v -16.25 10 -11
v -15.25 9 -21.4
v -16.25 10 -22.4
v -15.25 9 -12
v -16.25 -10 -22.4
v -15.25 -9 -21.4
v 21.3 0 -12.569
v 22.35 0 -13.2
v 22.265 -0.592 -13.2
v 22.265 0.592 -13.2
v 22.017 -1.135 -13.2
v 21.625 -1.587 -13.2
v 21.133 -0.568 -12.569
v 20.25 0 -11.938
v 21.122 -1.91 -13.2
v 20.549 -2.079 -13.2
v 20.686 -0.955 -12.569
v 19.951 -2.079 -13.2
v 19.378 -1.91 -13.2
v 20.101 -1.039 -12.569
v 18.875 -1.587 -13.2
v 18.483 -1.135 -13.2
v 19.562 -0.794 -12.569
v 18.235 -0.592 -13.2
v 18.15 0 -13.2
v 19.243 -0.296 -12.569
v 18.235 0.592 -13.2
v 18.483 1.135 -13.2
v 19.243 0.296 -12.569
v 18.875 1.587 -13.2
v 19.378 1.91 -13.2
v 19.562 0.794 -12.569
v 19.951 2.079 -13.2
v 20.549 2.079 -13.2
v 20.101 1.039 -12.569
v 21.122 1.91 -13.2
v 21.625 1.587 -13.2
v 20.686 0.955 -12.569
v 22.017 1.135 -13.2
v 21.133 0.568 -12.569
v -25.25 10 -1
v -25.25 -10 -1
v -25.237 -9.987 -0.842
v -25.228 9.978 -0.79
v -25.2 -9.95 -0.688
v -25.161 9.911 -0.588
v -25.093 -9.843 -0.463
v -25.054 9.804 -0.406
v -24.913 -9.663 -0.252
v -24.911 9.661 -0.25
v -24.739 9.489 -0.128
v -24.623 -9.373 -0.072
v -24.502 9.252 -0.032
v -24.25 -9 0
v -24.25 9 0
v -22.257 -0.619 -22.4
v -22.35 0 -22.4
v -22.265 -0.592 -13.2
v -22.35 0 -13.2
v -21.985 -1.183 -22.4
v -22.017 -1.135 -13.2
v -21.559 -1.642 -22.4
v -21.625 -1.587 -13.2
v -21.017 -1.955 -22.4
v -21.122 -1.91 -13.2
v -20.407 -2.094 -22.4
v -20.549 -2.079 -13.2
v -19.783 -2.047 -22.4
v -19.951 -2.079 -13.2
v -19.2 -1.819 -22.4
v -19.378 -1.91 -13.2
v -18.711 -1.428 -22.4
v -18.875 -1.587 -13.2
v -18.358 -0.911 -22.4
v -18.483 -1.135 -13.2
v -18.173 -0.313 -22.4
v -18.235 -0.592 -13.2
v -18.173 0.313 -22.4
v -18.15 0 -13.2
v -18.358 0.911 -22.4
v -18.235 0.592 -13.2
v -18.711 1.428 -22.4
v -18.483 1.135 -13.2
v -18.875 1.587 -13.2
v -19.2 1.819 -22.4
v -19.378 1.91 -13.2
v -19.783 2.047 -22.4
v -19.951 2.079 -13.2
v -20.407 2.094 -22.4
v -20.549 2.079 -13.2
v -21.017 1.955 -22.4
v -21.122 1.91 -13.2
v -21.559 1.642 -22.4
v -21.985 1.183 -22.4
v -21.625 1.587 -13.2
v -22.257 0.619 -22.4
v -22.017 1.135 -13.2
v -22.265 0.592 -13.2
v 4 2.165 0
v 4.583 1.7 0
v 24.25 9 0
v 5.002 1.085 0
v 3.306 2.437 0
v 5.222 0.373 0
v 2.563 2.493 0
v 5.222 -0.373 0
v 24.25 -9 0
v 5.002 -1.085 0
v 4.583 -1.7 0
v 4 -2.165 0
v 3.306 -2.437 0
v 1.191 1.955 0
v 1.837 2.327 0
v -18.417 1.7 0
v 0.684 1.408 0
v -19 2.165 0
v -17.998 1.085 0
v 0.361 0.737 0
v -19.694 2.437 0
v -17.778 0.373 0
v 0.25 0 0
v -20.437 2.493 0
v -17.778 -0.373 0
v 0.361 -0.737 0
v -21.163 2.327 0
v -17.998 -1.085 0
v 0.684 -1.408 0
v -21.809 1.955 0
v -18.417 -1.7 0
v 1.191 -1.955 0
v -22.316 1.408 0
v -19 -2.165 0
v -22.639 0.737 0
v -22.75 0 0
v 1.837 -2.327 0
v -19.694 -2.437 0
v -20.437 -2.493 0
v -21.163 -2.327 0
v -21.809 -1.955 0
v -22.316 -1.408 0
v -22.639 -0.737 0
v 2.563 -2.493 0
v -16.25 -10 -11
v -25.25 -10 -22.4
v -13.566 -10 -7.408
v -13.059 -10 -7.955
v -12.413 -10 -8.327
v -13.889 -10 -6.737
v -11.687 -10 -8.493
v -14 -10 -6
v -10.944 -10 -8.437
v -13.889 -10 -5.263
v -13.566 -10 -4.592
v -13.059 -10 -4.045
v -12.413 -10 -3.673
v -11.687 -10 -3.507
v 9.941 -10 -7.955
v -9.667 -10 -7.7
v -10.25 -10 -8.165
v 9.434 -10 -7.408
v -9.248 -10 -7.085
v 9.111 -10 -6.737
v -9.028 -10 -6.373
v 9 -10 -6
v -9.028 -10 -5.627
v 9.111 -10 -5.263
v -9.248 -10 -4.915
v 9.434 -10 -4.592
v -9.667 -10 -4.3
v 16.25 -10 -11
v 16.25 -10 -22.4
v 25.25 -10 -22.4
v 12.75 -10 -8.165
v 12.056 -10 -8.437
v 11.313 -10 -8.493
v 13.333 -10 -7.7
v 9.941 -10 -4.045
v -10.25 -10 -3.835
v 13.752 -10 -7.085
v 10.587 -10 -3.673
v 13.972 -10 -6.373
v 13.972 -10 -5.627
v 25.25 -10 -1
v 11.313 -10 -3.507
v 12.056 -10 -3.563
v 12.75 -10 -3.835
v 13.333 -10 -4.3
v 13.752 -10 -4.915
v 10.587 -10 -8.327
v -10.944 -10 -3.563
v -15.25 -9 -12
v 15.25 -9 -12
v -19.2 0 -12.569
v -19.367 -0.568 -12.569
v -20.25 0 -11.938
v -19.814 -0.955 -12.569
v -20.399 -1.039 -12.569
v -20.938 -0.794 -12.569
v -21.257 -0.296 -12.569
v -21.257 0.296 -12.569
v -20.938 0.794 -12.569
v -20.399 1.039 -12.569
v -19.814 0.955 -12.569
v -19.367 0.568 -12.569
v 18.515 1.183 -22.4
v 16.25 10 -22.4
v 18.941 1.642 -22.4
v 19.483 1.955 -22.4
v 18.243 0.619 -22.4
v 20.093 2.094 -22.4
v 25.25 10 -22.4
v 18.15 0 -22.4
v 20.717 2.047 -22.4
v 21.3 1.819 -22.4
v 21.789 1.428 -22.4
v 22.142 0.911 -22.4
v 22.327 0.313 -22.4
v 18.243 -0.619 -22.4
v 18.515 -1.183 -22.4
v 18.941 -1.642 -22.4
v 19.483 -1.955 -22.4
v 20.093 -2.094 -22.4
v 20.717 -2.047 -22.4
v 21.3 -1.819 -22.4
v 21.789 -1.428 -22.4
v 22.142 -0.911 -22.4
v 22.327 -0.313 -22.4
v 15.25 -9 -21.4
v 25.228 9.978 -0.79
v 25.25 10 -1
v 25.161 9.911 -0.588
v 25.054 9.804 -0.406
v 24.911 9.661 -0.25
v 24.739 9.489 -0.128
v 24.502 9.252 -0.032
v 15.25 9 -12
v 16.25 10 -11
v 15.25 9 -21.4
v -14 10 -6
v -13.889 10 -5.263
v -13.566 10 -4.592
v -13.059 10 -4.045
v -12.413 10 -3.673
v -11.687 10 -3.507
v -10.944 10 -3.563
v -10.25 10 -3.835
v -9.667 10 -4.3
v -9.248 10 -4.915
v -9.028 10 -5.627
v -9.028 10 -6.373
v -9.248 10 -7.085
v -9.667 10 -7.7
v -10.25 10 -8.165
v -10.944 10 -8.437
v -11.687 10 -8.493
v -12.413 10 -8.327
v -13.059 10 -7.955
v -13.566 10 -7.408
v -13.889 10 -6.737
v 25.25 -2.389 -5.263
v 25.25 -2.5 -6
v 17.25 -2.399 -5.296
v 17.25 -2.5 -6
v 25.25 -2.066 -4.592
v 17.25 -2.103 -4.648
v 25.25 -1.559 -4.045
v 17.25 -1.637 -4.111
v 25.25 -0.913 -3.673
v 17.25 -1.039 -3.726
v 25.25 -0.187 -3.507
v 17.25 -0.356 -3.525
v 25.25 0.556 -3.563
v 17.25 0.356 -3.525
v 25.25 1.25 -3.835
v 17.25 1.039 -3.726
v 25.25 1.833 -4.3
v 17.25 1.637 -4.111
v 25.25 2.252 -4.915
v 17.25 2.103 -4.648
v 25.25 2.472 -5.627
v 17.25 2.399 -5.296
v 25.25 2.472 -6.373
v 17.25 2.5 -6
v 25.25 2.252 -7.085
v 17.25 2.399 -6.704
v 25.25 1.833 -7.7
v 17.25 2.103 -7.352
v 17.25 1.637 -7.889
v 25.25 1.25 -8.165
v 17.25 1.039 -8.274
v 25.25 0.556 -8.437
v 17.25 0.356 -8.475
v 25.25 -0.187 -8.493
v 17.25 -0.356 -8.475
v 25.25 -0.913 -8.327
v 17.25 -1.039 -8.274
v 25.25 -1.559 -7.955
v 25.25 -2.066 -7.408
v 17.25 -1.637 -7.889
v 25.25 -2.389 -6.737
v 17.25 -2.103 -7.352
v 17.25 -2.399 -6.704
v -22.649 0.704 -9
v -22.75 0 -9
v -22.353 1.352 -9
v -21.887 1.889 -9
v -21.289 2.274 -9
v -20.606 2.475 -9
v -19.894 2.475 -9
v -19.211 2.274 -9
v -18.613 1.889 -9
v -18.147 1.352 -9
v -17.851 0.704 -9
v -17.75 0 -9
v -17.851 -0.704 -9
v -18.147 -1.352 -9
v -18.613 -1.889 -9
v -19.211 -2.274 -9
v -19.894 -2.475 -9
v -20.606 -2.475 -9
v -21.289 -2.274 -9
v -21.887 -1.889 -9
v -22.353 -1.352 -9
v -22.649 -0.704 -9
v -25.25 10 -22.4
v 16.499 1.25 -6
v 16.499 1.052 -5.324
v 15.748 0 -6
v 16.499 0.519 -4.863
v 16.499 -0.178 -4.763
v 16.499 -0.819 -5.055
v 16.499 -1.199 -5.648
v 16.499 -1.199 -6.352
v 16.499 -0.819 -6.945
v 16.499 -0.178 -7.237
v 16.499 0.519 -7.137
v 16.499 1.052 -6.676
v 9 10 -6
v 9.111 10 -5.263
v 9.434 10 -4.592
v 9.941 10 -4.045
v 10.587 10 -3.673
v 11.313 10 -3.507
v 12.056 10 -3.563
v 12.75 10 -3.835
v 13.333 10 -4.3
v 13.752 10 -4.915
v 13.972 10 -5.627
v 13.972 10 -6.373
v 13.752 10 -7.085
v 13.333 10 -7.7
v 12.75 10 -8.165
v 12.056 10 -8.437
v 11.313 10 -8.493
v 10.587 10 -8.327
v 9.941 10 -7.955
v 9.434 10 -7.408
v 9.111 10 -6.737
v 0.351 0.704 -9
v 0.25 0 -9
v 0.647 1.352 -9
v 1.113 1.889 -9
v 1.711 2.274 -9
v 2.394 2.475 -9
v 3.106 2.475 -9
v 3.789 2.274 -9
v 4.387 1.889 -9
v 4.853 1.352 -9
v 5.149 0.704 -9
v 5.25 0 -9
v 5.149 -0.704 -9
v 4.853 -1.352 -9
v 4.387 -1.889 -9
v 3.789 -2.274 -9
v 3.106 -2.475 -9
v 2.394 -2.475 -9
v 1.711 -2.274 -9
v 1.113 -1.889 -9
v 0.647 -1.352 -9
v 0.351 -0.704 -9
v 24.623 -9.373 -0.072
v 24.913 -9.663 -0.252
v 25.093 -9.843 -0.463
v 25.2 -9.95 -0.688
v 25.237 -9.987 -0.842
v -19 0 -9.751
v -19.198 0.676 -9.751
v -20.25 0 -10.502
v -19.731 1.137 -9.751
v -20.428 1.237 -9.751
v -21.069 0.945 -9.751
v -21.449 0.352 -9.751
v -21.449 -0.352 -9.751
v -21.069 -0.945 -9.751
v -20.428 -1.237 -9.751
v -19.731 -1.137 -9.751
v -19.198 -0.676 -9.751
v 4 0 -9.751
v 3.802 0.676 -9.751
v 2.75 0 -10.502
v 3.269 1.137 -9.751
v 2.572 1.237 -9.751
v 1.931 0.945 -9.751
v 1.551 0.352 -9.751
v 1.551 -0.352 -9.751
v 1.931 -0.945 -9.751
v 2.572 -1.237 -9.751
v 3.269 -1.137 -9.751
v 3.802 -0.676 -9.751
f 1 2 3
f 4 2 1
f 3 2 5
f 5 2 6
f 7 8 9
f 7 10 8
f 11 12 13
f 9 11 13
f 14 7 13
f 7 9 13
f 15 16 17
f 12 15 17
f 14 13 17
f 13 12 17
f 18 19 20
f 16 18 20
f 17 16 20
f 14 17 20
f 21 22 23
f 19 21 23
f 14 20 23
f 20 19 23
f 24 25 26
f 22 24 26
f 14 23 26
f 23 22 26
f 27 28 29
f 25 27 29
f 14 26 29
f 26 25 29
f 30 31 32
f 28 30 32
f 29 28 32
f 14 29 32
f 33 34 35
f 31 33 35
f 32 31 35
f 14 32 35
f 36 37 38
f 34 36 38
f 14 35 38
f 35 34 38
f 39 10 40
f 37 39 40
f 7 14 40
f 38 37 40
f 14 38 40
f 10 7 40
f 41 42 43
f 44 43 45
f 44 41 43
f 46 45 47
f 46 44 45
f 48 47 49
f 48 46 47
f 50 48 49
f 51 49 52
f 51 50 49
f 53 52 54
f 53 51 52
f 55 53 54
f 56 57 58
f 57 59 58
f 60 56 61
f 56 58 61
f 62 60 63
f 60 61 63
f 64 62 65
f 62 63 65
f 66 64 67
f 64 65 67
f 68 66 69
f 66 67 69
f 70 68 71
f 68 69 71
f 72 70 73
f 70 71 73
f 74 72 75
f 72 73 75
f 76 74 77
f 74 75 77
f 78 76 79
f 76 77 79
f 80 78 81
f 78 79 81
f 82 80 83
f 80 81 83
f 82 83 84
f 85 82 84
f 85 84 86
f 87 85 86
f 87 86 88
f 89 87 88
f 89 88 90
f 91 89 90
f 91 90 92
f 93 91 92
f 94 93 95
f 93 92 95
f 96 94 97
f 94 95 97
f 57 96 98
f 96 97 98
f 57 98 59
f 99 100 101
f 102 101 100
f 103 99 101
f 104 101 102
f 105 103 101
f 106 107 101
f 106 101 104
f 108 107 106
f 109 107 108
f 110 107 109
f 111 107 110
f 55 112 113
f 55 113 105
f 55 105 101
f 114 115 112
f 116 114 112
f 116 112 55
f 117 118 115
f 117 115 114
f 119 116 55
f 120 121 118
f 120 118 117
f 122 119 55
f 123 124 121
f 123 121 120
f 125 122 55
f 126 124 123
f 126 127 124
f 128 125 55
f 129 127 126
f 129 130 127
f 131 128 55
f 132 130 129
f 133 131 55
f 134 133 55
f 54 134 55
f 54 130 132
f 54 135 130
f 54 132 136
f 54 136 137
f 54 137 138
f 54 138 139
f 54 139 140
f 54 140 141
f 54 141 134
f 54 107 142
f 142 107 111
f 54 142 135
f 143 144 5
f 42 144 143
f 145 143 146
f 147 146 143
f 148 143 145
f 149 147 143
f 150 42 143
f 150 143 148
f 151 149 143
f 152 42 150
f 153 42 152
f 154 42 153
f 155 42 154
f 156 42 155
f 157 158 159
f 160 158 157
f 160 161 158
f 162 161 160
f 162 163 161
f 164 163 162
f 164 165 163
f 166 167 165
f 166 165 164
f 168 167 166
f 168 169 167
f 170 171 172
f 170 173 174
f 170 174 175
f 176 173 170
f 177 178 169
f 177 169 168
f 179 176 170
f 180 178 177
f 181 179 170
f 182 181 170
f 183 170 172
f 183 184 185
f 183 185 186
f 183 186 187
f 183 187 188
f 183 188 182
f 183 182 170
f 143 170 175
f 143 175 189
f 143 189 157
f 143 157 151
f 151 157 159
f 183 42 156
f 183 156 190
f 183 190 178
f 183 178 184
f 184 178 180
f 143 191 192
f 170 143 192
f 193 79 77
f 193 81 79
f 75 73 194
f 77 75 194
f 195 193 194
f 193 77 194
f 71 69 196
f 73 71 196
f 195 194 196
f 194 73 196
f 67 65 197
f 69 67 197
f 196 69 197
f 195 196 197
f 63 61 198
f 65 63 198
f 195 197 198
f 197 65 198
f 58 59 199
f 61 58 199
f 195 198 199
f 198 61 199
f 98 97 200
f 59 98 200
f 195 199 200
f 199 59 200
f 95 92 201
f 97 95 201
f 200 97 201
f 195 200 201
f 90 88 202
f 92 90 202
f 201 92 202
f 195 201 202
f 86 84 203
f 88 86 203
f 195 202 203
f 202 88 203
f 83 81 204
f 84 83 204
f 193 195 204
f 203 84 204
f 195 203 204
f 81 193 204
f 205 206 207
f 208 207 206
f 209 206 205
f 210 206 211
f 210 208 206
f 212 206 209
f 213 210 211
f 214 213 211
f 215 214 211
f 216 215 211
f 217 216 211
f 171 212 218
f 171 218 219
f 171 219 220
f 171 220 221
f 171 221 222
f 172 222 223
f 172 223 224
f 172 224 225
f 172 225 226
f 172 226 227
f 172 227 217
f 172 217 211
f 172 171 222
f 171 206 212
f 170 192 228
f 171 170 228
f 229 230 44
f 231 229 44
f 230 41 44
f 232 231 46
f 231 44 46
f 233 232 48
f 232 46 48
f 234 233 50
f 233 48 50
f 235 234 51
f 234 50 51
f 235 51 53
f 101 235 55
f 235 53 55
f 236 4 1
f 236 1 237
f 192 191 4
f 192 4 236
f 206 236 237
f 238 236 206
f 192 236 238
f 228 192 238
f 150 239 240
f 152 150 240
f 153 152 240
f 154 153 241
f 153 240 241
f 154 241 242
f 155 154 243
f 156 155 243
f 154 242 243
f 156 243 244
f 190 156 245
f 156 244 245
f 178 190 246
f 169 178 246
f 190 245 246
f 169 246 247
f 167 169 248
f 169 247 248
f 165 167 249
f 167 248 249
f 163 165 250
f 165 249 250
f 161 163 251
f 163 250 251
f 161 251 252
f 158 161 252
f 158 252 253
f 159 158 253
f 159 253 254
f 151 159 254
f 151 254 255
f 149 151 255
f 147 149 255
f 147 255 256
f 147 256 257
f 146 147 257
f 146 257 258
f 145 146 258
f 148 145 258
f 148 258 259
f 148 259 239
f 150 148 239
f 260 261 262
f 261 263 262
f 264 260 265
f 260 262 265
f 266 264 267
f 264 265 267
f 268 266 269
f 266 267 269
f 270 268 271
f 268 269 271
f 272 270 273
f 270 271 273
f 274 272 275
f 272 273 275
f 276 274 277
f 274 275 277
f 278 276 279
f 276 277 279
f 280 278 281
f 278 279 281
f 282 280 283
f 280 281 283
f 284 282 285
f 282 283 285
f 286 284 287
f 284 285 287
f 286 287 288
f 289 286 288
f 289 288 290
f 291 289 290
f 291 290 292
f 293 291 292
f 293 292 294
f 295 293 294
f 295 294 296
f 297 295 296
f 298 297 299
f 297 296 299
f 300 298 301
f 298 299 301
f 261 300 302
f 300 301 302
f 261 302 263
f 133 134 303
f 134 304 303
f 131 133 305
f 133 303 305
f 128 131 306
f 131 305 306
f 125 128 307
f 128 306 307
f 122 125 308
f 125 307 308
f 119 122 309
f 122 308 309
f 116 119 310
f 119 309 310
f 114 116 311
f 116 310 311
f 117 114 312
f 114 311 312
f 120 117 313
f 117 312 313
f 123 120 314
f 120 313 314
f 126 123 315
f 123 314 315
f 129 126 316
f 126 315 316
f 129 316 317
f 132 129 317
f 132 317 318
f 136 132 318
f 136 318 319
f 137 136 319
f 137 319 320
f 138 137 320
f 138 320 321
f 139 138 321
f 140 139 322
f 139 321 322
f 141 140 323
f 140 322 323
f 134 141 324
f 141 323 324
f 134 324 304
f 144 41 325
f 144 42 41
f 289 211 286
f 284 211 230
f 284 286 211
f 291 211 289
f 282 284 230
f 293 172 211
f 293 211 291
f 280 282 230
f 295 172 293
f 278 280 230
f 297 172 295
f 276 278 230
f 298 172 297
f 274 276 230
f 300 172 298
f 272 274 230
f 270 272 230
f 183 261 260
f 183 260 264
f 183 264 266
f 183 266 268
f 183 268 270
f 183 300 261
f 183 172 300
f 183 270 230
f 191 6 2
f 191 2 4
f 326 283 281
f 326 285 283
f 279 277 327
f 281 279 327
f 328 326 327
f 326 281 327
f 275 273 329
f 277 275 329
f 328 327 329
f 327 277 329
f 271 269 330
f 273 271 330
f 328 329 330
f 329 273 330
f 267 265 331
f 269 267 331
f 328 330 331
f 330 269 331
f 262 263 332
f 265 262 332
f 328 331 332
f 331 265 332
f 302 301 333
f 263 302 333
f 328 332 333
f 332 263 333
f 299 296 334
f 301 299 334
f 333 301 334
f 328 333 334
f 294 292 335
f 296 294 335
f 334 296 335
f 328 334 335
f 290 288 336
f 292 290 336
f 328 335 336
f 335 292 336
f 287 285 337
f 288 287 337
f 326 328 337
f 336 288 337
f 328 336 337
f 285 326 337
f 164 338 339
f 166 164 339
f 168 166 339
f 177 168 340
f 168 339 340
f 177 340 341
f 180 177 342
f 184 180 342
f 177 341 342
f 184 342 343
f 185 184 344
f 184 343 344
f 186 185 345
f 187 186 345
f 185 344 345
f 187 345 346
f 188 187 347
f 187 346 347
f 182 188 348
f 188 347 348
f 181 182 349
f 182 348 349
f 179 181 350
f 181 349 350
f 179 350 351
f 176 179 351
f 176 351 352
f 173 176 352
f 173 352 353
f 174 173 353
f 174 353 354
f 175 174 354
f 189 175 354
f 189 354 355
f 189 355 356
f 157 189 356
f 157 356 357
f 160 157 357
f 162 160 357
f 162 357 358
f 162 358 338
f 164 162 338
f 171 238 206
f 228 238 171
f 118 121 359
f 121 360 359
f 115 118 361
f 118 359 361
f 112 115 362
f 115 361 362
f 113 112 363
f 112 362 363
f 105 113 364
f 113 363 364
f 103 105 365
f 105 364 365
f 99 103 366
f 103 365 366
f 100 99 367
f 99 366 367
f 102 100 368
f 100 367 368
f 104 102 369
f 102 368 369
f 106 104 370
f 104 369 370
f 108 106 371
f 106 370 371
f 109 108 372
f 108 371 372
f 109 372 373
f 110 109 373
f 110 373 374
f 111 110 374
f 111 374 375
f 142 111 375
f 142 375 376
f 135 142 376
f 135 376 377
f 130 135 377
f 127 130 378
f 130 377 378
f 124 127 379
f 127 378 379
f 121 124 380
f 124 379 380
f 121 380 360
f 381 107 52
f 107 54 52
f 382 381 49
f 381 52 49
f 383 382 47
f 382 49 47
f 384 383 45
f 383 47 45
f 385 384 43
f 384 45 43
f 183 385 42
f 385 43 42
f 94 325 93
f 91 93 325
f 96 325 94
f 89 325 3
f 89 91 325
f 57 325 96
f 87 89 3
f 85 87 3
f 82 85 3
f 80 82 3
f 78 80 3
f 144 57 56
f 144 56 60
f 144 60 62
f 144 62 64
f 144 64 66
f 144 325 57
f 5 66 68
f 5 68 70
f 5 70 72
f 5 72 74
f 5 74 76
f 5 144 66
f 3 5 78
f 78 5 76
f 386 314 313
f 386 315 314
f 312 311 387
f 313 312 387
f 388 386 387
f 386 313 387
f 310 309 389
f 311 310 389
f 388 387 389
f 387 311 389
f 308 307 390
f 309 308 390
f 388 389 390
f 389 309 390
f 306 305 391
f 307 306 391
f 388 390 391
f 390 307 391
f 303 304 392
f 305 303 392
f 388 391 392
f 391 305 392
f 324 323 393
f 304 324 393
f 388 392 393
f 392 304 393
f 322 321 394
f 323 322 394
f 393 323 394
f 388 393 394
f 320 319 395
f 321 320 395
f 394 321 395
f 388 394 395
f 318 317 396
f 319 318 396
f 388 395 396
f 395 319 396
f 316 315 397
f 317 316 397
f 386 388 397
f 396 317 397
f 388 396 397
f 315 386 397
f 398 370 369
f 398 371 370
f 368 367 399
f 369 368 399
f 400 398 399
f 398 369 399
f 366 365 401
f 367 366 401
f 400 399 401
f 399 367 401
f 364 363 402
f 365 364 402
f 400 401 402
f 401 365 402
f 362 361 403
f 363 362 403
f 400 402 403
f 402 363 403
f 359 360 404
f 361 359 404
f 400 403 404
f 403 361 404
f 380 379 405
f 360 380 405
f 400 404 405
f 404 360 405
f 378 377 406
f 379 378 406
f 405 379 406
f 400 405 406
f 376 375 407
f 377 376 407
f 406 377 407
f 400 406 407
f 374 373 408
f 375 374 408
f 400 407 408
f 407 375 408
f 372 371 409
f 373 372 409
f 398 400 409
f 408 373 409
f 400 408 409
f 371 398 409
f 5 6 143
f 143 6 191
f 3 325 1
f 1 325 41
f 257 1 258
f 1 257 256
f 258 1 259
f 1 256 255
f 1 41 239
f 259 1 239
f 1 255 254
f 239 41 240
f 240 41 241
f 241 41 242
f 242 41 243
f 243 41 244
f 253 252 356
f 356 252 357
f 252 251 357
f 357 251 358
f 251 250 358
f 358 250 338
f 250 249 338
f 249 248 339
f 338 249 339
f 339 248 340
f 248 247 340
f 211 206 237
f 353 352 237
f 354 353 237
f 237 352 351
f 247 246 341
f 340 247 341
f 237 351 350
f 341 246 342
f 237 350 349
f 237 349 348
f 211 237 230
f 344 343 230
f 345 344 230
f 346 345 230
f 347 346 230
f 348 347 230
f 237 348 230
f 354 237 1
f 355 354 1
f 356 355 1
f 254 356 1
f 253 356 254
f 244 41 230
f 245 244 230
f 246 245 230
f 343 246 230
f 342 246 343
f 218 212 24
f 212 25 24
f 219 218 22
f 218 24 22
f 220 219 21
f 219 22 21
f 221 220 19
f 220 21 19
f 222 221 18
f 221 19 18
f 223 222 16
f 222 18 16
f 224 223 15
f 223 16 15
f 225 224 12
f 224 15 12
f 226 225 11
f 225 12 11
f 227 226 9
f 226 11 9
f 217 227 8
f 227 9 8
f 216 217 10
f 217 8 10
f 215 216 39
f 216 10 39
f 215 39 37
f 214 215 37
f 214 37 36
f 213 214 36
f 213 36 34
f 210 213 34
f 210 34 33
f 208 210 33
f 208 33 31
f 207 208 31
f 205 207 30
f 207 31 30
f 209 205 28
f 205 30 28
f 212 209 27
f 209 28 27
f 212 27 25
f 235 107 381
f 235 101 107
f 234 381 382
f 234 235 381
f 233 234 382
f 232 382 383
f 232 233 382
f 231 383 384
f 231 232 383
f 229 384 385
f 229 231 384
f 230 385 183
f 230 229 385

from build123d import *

# Parameters (mm, degrees)
F1_DEPTH = 10
F3_D     = 5
F3_DEPTH = 8
F3_TIP   = 1.5021515476
F5_D     = 4.2
F5_DEPTH = 9.2
F5_TIP   = 1.2618073
F7_D     = 5
F9_D     = 5
F9_DEPTH = 9
F9_TIP   = 1.5021515476
F10_SIZE = 1
F11_R    = 1


# Not quite as in the source:
# - a feature names something its author has since deleted; it is built from what else it names


with BuildPart() as f1:
    # F0 (on Front) → F1 (new body, symmetric)
    with BuildSketch(Plane.XZ):
        Polygon((-25.25, 0), (-25.25, -22.4), (-15.25, -22.4), (-15.25, -12), (15.25, -12), (15.25, -22.4), (25.25, -22.4), (25.25, 0), align=None)
    extrude(amount=F1_DEPTH, both=True)

    # F3
    with Locations(Plane.YZ.offset(25.25)):
        with Locations((0, -6)):
            Hole(F3_D / 2, depth=F3_DEPTH)
            with Locations((0, 0, -(F3_DEPTH + F3_TIP / 2))):  # 118° drill point
                Cone(0, F3_D / 2, F3_TIP, mode=Mode.SUBTRACT)

    # F5
    with Locations(Plane(origin=(0, 0, -22.4), x_dir=(1, 0, 0), z_dir=(0, 0, -1))):
        with Locations((-20.25, 0), (20.25, 0)):
            Hole(F5_D / 2, depth=F5_DEPTH)
            with Locations((0, 0, -(F5_DEPTH + F5_TIP / 2))):  # 118° drill point
                Cone(0, F5_D / 2, F5_TIP, mode=Mode.SUBTRACT)

    # F7 (through all)
    with Locations(Plane.XZ.offset(10)):
        with Locations((11.5, -6), (-11.5, -6)):
            Hole(F7_D / 2)

    # F9
    with Locations(Plane.XY):
        with Locations((-20.25, 0), (2.75, 0)):
            Hole(F9_D / 2, depth=F9_DEPTH)
            with Locations((0, 0, -(F9_DEPTH + F9_TIP / 2))):  # 118° drill point
                Cone(0, F9_D / 2, F9_TIP, mode=Mode.SUBTRACT)

    # F10
    f10_edges = [f1.edges().sort_by_distance(p)[0] for p in [
        (15.25, 0, -22.4),
        (-15.25, 0, -22.4),
        (-15.25, -10, -17.2),
        (0, -10, -12),
        (15.25, -10, -17.2),
        (0, 10, -12),
        (-15.25, 10, -17.2),
        (15.25, 10, -17.2),
    ]]
    chamfer(f10_edges, length=F10_SIZE)

    # F11
    f11_edges = [f1.edges().sort_by_distance(p)[0] for p in [
        (0, 10, 0),
        (0, -10, 0),
        (-25.25, 0, 0),
        (25.25, 0, 0),
    ]]
    fillet(f11_edges, radius=F11_R)


solid = f1.part
